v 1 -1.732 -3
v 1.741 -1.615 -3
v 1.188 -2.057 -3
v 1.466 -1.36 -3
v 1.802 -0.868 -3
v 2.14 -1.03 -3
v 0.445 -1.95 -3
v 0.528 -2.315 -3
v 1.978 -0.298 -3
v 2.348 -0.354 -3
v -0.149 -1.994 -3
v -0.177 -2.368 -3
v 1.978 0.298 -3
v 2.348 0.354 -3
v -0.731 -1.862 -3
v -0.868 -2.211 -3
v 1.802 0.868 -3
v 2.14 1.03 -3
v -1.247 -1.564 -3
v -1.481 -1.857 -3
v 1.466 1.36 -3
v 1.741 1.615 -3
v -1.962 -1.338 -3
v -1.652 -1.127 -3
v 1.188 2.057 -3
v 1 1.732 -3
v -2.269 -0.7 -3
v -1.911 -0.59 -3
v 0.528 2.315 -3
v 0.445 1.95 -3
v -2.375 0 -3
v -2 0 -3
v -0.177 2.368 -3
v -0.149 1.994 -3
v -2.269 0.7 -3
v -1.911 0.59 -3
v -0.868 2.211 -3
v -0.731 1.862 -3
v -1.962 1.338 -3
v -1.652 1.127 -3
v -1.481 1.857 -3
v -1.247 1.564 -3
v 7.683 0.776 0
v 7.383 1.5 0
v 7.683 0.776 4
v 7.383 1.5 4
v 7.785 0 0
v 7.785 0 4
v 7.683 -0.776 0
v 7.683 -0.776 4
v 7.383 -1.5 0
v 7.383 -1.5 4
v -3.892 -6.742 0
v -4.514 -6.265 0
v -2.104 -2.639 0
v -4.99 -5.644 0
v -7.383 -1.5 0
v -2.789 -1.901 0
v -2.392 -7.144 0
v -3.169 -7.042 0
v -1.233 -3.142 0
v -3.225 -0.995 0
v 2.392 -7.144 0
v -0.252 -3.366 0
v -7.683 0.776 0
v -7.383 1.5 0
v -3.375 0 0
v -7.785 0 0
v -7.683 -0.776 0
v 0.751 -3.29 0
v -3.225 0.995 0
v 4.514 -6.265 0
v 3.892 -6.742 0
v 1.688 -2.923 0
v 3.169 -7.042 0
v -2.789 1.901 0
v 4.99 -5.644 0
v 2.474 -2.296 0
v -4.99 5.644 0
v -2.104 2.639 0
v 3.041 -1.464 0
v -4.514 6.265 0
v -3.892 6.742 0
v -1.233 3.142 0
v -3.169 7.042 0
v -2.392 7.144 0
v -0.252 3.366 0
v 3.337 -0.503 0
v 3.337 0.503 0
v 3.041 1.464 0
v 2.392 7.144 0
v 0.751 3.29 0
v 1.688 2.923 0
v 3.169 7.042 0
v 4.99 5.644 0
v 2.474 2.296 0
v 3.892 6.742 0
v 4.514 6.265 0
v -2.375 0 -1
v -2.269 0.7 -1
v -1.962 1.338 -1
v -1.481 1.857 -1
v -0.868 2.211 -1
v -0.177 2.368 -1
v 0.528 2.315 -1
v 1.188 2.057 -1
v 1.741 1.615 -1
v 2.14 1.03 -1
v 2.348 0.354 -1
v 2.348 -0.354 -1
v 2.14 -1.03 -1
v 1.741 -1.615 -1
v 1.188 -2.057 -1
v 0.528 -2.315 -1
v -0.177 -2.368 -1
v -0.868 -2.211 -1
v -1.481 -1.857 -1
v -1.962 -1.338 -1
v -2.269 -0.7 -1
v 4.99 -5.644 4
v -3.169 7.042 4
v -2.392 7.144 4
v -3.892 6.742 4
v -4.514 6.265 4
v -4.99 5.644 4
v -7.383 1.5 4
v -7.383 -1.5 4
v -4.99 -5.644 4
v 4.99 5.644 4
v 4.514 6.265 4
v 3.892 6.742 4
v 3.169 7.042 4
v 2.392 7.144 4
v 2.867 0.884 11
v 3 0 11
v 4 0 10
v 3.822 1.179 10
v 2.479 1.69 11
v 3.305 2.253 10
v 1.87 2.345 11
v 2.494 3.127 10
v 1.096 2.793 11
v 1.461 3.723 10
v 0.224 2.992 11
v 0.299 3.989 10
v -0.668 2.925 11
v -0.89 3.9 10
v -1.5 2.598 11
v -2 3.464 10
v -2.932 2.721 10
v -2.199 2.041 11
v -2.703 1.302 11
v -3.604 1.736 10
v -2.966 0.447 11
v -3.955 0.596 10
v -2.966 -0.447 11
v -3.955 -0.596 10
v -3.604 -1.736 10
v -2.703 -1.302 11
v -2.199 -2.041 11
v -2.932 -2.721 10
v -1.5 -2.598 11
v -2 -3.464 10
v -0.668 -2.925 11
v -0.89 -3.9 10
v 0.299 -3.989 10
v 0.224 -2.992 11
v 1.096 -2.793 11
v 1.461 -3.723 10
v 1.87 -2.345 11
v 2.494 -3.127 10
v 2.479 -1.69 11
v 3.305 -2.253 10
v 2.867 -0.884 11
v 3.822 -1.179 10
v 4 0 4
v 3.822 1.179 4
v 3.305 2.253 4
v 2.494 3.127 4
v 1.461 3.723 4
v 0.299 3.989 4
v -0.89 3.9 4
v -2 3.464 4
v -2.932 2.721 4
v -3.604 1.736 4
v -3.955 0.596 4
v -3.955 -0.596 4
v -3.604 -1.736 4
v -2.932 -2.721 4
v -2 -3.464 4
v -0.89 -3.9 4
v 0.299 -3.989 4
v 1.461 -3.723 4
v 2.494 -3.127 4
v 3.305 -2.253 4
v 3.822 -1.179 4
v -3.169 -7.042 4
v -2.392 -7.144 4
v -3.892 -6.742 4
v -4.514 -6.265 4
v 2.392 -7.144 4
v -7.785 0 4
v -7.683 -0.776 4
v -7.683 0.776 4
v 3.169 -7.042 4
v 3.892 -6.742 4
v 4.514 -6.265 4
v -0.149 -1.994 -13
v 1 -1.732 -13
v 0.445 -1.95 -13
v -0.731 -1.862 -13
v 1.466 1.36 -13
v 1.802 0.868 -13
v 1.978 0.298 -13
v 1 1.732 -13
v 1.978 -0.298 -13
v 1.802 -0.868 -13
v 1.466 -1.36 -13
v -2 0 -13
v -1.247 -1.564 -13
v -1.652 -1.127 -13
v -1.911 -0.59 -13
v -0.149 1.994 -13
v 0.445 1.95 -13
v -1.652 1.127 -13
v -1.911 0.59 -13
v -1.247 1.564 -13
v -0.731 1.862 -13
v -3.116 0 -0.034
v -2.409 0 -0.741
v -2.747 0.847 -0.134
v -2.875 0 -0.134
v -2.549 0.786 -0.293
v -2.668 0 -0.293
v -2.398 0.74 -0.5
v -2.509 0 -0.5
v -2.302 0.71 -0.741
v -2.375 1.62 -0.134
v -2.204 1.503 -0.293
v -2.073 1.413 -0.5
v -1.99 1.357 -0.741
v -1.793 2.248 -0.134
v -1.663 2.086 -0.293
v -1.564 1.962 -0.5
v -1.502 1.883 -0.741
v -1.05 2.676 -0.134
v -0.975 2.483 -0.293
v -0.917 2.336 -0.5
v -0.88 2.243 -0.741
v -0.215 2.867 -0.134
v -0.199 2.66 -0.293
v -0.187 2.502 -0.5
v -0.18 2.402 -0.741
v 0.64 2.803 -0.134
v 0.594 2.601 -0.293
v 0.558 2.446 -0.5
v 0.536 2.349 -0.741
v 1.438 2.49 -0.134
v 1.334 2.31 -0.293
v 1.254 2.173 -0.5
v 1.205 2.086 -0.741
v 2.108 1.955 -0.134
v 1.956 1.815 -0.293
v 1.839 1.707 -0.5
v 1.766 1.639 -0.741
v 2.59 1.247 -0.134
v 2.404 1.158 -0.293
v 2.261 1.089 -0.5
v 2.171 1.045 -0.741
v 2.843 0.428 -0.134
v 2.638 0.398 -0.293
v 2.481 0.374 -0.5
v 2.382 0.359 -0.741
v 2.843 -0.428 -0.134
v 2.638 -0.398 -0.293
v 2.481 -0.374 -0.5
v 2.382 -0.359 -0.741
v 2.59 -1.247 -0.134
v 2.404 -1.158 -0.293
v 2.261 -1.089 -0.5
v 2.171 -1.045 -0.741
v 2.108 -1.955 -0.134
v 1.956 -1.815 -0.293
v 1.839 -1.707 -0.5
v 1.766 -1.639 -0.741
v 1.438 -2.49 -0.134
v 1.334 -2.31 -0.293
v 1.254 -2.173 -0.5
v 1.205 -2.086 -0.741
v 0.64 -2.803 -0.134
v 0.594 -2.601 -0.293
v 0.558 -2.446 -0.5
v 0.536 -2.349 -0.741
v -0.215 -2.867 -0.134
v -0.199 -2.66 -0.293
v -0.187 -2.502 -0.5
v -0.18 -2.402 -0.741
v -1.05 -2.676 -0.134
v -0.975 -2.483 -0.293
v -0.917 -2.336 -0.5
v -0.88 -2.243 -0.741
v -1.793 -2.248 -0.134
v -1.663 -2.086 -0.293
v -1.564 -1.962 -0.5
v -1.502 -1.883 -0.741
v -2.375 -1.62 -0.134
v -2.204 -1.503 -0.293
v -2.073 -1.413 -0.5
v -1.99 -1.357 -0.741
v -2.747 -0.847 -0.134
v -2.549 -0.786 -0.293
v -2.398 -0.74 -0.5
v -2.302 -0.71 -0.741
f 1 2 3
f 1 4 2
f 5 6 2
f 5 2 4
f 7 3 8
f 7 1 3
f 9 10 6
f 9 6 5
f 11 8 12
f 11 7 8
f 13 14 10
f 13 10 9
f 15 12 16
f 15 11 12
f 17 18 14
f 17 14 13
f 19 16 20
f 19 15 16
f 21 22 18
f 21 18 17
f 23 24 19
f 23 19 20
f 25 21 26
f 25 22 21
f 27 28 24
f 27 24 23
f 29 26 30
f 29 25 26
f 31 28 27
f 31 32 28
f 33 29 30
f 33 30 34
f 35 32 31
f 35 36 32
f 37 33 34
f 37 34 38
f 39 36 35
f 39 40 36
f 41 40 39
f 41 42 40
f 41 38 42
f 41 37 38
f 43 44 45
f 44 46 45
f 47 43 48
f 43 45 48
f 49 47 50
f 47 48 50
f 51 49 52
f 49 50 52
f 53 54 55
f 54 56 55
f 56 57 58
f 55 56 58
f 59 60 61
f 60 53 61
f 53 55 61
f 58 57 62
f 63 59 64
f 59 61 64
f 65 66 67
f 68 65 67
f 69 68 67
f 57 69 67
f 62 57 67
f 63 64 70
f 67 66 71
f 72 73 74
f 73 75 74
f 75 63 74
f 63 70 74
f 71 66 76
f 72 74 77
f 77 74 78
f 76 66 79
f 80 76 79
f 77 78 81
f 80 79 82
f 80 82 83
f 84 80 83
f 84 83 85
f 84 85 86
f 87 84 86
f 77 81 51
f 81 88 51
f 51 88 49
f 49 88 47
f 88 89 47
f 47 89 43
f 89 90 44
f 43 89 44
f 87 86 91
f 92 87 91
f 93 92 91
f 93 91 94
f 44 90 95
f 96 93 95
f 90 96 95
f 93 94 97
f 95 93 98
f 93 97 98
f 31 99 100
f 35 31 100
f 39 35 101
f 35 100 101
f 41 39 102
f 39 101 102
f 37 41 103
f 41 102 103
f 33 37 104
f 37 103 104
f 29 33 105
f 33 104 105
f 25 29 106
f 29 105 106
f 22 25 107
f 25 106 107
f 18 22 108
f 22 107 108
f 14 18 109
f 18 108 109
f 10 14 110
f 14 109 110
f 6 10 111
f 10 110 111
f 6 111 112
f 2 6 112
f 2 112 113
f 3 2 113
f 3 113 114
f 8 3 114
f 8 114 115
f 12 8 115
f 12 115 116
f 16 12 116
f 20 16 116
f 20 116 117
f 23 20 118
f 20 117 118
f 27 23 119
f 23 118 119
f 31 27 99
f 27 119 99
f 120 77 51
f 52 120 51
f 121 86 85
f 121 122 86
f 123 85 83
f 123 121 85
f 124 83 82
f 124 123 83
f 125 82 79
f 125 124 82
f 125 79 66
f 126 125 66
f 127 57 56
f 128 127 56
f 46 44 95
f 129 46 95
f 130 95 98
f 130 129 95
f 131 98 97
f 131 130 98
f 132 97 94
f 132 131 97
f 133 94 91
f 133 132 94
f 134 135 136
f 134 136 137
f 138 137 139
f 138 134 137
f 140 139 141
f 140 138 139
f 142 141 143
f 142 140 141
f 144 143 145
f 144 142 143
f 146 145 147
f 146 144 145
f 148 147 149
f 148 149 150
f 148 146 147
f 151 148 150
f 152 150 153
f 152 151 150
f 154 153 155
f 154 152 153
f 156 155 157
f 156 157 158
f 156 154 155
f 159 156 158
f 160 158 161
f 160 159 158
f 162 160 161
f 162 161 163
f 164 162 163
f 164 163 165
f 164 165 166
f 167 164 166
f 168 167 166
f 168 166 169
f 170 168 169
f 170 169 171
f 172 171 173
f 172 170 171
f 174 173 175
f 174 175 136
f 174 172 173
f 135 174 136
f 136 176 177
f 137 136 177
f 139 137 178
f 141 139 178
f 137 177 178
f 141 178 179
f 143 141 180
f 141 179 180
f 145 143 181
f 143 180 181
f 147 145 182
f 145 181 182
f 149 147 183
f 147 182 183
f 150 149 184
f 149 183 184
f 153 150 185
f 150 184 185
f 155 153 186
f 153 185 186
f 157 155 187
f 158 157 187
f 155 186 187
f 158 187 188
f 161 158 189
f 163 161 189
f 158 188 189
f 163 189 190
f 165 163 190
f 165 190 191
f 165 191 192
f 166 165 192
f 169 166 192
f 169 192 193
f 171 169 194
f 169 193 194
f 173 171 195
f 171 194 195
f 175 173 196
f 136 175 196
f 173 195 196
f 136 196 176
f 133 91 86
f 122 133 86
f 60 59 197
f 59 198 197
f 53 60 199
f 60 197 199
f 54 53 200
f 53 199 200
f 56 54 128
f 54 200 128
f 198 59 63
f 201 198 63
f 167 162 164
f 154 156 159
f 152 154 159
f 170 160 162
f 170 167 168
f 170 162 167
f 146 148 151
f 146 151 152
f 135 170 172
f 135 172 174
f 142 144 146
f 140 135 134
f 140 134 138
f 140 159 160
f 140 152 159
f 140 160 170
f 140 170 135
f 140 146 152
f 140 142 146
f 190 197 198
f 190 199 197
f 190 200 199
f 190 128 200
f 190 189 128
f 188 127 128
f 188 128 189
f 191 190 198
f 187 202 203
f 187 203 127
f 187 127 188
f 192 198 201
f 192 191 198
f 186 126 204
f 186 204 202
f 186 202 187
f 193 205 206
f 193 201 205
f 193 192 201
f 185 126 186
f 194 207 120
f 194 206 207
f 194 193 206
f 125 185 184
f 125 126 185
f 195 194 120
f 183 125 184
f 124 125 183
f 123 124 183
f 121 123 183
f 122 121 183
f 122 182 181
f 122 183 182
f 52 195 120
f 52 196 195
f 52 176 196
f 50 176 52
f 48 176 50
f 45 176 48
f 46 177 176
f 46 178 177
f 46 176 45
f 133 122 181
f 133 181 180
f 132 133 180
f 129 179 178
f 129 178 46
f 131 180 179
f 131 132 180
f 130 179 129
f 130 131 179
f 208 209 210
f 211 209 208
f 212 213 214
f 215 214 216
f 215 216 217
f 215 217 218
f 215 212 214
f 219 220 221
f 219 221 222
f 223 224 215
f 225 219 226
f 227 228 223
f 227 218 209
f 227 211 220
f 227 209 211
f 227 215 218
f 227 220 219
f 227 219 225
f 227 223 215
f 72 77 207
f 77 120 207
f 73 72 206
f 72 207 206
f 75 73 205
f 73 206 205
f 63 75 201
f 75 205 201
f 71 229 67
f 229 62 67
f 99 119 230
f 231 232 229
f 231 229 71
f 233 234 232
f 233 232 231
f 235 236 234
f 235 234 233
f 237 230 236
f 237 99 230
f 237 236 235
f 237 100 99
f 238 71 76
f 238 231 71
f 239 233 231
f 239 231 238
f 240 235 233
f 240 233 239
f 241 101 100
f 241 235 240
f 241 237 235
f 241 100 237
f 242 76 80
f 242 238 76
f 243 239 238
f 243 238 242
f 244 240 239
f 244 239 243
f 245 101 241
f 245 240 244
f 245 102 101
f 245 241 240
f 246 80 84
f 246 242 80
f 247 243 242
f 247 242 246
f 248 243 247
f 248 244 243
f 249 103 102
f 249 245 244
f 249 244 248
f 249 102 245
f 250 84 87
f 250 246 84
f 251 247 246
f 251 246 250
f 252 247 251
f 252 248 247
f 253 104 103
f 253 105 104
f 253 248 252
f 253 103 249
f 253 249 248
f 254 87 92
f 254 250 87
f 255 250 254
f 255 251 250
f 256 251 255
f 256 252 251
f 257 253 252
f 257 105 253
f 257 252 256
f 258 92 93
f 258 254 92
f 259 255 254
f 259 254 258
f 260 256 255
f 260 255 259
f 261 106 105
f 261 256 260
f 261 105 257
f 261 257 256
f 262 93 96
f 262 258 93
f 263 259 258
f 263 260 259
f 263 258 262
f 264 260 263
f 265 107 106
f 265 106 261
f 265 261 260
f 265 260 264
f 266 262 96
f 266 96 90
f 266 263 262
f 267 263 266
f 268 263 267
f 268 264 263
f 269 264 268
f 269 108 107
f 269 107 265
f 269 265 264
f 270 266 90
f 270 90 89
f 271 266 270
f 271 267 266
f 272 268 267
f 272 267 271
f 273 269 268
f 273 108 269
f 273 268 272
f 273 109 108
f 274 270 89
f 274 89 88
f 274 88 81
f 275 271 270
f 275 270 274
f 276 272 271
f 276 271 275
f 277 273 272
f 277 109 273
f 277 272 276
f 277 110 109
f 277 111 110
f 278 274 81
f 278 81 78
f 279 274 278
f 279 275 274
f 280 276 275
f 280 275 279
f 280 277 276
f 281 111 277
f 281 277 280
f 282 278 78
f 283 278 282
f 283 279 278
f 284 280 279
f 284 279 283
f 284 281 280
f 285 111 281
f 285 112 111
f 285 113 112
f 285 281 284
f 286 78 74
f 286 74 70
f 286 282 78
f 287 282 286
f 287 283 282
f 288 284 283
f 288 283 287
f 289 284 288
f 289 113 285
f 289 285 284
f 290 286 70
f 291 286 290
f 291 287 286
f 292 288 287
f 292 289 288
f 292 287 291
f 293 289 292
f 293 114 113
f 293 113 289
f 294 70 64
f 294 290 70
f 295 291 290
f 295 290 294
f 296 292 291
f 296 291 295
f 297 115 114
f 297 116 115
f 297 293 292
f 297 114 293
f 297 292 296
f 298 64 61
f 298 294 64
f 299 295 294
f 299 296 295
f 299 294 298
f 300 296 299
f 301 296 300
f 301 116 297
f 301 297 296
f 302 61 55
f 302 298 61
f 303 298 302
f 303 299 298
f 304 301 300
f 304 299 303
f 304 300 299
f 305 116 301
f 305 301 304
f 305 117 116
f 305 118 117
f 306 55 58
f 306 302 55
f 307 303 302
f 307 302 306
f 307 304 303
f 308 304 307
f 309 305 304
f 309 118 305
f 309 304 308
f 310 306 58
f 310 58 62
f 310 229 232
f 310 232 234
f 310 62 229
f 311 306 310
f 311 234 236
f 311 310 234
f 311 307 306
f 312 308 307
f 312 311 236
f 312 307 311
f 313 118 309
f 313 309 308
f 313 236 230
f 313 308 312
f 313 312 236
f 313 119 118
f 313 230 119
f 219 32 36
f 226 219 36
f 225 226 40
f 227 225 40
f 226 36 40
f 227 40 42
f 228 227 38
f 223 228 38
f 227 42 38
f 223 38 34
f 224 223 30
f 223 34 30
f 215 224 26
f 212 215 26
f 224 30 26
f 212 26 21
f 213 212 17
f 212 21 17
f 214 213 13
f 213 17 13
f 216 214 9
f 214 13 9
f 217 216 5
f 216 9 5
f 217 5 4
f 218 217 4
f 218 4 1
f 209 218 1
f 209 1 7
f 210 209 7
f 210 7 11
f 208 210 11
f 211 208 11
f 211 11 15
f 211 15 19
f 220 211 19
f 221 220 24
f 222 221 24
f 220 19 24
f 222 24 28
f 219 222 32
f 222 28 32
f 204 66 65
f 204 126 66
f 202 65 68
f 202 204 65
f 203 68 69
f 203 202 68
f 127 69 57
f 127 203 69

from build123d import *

# Parameters (mm, degrees)
BOSS_EXTRUDE1_DEPTH = 4
SKETCH2_R           = 4
BOSS_EXTRUDE2_DEPTH = 7
CHAMFER1_SIZE       = 1
SKETCH3_R           = 2.375
BOSS_EXTRUDE3_DEPTH = 3
SKETCH4_R           = 2
BOSS_EXTRUDE4_DEPTH = 10
FILLET2_R           = 3
FILLET3_R           = 1


with BuildPart() as part:
    # Sketch1 → Boss-Extrude1 (new body)
    with BuildSketch(Plane.XY):
        Polygon((8.248891971, 0), (4.124445986, 7.14375), (-4.124445986, 7.14375), (-8.248891971, 0), (-4.124445986, -7.14375), (4.124445986, -7.14375), align=None)
    extrude(amount=BOSS_EXTRUDE1_DEPTH)

    # Sketch2 → Boss-Extrude2 (add)
    with BuildSketch(Plane.XY.offset(4)):
        Circle(SKETCH2_R)
    extrude(amount=BOSS_EXTRUDE2_DEPTH)

    # Chamfer1
    chamfer1_edges = [part.edges().sort_by_distance(p)[0] for p in [
        (-4, 0, 11),
    ]]
    chamfer(chamfer1_edges, length=CHAMFER1_SIZE)

    # Sketch3 → Boss-Extrude3 (add)
    with BuildSketch(Plane(origin=(0, 0, 0), x_dir=(-1, 0, 0), z_dir=(0, 0, -1))):
        Circle(SKETCH3_R)
    extrude(amount=BOSS_EXTRUDE3_DEPTH)

    # Sketch4 → Boss-Extrude4 (add)
    with BuildSketch(Plane(origin=(0, 0, -3), x_dir=(-1, 0, 0), z_dir=(0, 0, -1))):
        Circle(SKETCH4_R)
    extrude(amount=BOSS_EXTRUDE4_DEPTH)

    # Fillet2
    fillet2_edges = [part.edges().sort_by_distance(p)[0] for p in [
        (4.124445986, -7.14375, 2),
        (-4.124445986, -7.14375, 2),
        (-8.248891971, 0, 2),
        (-4.124445986, 7.14375, 2),
        (4.124445986, 7.14375, 2),
        (8.248891971, 0, 2),
    ]]
    fillet(fillet2_edges, radius=FILLET2_R)

    # Fillet3
    fillet3_edges = [part.edges().sort_by_distance(p)[0] for p in [
        (2.375, 0, 0),
    ]]
    fillet(fillet3_edges, radius=FILLET3_R)


solid = part.part
